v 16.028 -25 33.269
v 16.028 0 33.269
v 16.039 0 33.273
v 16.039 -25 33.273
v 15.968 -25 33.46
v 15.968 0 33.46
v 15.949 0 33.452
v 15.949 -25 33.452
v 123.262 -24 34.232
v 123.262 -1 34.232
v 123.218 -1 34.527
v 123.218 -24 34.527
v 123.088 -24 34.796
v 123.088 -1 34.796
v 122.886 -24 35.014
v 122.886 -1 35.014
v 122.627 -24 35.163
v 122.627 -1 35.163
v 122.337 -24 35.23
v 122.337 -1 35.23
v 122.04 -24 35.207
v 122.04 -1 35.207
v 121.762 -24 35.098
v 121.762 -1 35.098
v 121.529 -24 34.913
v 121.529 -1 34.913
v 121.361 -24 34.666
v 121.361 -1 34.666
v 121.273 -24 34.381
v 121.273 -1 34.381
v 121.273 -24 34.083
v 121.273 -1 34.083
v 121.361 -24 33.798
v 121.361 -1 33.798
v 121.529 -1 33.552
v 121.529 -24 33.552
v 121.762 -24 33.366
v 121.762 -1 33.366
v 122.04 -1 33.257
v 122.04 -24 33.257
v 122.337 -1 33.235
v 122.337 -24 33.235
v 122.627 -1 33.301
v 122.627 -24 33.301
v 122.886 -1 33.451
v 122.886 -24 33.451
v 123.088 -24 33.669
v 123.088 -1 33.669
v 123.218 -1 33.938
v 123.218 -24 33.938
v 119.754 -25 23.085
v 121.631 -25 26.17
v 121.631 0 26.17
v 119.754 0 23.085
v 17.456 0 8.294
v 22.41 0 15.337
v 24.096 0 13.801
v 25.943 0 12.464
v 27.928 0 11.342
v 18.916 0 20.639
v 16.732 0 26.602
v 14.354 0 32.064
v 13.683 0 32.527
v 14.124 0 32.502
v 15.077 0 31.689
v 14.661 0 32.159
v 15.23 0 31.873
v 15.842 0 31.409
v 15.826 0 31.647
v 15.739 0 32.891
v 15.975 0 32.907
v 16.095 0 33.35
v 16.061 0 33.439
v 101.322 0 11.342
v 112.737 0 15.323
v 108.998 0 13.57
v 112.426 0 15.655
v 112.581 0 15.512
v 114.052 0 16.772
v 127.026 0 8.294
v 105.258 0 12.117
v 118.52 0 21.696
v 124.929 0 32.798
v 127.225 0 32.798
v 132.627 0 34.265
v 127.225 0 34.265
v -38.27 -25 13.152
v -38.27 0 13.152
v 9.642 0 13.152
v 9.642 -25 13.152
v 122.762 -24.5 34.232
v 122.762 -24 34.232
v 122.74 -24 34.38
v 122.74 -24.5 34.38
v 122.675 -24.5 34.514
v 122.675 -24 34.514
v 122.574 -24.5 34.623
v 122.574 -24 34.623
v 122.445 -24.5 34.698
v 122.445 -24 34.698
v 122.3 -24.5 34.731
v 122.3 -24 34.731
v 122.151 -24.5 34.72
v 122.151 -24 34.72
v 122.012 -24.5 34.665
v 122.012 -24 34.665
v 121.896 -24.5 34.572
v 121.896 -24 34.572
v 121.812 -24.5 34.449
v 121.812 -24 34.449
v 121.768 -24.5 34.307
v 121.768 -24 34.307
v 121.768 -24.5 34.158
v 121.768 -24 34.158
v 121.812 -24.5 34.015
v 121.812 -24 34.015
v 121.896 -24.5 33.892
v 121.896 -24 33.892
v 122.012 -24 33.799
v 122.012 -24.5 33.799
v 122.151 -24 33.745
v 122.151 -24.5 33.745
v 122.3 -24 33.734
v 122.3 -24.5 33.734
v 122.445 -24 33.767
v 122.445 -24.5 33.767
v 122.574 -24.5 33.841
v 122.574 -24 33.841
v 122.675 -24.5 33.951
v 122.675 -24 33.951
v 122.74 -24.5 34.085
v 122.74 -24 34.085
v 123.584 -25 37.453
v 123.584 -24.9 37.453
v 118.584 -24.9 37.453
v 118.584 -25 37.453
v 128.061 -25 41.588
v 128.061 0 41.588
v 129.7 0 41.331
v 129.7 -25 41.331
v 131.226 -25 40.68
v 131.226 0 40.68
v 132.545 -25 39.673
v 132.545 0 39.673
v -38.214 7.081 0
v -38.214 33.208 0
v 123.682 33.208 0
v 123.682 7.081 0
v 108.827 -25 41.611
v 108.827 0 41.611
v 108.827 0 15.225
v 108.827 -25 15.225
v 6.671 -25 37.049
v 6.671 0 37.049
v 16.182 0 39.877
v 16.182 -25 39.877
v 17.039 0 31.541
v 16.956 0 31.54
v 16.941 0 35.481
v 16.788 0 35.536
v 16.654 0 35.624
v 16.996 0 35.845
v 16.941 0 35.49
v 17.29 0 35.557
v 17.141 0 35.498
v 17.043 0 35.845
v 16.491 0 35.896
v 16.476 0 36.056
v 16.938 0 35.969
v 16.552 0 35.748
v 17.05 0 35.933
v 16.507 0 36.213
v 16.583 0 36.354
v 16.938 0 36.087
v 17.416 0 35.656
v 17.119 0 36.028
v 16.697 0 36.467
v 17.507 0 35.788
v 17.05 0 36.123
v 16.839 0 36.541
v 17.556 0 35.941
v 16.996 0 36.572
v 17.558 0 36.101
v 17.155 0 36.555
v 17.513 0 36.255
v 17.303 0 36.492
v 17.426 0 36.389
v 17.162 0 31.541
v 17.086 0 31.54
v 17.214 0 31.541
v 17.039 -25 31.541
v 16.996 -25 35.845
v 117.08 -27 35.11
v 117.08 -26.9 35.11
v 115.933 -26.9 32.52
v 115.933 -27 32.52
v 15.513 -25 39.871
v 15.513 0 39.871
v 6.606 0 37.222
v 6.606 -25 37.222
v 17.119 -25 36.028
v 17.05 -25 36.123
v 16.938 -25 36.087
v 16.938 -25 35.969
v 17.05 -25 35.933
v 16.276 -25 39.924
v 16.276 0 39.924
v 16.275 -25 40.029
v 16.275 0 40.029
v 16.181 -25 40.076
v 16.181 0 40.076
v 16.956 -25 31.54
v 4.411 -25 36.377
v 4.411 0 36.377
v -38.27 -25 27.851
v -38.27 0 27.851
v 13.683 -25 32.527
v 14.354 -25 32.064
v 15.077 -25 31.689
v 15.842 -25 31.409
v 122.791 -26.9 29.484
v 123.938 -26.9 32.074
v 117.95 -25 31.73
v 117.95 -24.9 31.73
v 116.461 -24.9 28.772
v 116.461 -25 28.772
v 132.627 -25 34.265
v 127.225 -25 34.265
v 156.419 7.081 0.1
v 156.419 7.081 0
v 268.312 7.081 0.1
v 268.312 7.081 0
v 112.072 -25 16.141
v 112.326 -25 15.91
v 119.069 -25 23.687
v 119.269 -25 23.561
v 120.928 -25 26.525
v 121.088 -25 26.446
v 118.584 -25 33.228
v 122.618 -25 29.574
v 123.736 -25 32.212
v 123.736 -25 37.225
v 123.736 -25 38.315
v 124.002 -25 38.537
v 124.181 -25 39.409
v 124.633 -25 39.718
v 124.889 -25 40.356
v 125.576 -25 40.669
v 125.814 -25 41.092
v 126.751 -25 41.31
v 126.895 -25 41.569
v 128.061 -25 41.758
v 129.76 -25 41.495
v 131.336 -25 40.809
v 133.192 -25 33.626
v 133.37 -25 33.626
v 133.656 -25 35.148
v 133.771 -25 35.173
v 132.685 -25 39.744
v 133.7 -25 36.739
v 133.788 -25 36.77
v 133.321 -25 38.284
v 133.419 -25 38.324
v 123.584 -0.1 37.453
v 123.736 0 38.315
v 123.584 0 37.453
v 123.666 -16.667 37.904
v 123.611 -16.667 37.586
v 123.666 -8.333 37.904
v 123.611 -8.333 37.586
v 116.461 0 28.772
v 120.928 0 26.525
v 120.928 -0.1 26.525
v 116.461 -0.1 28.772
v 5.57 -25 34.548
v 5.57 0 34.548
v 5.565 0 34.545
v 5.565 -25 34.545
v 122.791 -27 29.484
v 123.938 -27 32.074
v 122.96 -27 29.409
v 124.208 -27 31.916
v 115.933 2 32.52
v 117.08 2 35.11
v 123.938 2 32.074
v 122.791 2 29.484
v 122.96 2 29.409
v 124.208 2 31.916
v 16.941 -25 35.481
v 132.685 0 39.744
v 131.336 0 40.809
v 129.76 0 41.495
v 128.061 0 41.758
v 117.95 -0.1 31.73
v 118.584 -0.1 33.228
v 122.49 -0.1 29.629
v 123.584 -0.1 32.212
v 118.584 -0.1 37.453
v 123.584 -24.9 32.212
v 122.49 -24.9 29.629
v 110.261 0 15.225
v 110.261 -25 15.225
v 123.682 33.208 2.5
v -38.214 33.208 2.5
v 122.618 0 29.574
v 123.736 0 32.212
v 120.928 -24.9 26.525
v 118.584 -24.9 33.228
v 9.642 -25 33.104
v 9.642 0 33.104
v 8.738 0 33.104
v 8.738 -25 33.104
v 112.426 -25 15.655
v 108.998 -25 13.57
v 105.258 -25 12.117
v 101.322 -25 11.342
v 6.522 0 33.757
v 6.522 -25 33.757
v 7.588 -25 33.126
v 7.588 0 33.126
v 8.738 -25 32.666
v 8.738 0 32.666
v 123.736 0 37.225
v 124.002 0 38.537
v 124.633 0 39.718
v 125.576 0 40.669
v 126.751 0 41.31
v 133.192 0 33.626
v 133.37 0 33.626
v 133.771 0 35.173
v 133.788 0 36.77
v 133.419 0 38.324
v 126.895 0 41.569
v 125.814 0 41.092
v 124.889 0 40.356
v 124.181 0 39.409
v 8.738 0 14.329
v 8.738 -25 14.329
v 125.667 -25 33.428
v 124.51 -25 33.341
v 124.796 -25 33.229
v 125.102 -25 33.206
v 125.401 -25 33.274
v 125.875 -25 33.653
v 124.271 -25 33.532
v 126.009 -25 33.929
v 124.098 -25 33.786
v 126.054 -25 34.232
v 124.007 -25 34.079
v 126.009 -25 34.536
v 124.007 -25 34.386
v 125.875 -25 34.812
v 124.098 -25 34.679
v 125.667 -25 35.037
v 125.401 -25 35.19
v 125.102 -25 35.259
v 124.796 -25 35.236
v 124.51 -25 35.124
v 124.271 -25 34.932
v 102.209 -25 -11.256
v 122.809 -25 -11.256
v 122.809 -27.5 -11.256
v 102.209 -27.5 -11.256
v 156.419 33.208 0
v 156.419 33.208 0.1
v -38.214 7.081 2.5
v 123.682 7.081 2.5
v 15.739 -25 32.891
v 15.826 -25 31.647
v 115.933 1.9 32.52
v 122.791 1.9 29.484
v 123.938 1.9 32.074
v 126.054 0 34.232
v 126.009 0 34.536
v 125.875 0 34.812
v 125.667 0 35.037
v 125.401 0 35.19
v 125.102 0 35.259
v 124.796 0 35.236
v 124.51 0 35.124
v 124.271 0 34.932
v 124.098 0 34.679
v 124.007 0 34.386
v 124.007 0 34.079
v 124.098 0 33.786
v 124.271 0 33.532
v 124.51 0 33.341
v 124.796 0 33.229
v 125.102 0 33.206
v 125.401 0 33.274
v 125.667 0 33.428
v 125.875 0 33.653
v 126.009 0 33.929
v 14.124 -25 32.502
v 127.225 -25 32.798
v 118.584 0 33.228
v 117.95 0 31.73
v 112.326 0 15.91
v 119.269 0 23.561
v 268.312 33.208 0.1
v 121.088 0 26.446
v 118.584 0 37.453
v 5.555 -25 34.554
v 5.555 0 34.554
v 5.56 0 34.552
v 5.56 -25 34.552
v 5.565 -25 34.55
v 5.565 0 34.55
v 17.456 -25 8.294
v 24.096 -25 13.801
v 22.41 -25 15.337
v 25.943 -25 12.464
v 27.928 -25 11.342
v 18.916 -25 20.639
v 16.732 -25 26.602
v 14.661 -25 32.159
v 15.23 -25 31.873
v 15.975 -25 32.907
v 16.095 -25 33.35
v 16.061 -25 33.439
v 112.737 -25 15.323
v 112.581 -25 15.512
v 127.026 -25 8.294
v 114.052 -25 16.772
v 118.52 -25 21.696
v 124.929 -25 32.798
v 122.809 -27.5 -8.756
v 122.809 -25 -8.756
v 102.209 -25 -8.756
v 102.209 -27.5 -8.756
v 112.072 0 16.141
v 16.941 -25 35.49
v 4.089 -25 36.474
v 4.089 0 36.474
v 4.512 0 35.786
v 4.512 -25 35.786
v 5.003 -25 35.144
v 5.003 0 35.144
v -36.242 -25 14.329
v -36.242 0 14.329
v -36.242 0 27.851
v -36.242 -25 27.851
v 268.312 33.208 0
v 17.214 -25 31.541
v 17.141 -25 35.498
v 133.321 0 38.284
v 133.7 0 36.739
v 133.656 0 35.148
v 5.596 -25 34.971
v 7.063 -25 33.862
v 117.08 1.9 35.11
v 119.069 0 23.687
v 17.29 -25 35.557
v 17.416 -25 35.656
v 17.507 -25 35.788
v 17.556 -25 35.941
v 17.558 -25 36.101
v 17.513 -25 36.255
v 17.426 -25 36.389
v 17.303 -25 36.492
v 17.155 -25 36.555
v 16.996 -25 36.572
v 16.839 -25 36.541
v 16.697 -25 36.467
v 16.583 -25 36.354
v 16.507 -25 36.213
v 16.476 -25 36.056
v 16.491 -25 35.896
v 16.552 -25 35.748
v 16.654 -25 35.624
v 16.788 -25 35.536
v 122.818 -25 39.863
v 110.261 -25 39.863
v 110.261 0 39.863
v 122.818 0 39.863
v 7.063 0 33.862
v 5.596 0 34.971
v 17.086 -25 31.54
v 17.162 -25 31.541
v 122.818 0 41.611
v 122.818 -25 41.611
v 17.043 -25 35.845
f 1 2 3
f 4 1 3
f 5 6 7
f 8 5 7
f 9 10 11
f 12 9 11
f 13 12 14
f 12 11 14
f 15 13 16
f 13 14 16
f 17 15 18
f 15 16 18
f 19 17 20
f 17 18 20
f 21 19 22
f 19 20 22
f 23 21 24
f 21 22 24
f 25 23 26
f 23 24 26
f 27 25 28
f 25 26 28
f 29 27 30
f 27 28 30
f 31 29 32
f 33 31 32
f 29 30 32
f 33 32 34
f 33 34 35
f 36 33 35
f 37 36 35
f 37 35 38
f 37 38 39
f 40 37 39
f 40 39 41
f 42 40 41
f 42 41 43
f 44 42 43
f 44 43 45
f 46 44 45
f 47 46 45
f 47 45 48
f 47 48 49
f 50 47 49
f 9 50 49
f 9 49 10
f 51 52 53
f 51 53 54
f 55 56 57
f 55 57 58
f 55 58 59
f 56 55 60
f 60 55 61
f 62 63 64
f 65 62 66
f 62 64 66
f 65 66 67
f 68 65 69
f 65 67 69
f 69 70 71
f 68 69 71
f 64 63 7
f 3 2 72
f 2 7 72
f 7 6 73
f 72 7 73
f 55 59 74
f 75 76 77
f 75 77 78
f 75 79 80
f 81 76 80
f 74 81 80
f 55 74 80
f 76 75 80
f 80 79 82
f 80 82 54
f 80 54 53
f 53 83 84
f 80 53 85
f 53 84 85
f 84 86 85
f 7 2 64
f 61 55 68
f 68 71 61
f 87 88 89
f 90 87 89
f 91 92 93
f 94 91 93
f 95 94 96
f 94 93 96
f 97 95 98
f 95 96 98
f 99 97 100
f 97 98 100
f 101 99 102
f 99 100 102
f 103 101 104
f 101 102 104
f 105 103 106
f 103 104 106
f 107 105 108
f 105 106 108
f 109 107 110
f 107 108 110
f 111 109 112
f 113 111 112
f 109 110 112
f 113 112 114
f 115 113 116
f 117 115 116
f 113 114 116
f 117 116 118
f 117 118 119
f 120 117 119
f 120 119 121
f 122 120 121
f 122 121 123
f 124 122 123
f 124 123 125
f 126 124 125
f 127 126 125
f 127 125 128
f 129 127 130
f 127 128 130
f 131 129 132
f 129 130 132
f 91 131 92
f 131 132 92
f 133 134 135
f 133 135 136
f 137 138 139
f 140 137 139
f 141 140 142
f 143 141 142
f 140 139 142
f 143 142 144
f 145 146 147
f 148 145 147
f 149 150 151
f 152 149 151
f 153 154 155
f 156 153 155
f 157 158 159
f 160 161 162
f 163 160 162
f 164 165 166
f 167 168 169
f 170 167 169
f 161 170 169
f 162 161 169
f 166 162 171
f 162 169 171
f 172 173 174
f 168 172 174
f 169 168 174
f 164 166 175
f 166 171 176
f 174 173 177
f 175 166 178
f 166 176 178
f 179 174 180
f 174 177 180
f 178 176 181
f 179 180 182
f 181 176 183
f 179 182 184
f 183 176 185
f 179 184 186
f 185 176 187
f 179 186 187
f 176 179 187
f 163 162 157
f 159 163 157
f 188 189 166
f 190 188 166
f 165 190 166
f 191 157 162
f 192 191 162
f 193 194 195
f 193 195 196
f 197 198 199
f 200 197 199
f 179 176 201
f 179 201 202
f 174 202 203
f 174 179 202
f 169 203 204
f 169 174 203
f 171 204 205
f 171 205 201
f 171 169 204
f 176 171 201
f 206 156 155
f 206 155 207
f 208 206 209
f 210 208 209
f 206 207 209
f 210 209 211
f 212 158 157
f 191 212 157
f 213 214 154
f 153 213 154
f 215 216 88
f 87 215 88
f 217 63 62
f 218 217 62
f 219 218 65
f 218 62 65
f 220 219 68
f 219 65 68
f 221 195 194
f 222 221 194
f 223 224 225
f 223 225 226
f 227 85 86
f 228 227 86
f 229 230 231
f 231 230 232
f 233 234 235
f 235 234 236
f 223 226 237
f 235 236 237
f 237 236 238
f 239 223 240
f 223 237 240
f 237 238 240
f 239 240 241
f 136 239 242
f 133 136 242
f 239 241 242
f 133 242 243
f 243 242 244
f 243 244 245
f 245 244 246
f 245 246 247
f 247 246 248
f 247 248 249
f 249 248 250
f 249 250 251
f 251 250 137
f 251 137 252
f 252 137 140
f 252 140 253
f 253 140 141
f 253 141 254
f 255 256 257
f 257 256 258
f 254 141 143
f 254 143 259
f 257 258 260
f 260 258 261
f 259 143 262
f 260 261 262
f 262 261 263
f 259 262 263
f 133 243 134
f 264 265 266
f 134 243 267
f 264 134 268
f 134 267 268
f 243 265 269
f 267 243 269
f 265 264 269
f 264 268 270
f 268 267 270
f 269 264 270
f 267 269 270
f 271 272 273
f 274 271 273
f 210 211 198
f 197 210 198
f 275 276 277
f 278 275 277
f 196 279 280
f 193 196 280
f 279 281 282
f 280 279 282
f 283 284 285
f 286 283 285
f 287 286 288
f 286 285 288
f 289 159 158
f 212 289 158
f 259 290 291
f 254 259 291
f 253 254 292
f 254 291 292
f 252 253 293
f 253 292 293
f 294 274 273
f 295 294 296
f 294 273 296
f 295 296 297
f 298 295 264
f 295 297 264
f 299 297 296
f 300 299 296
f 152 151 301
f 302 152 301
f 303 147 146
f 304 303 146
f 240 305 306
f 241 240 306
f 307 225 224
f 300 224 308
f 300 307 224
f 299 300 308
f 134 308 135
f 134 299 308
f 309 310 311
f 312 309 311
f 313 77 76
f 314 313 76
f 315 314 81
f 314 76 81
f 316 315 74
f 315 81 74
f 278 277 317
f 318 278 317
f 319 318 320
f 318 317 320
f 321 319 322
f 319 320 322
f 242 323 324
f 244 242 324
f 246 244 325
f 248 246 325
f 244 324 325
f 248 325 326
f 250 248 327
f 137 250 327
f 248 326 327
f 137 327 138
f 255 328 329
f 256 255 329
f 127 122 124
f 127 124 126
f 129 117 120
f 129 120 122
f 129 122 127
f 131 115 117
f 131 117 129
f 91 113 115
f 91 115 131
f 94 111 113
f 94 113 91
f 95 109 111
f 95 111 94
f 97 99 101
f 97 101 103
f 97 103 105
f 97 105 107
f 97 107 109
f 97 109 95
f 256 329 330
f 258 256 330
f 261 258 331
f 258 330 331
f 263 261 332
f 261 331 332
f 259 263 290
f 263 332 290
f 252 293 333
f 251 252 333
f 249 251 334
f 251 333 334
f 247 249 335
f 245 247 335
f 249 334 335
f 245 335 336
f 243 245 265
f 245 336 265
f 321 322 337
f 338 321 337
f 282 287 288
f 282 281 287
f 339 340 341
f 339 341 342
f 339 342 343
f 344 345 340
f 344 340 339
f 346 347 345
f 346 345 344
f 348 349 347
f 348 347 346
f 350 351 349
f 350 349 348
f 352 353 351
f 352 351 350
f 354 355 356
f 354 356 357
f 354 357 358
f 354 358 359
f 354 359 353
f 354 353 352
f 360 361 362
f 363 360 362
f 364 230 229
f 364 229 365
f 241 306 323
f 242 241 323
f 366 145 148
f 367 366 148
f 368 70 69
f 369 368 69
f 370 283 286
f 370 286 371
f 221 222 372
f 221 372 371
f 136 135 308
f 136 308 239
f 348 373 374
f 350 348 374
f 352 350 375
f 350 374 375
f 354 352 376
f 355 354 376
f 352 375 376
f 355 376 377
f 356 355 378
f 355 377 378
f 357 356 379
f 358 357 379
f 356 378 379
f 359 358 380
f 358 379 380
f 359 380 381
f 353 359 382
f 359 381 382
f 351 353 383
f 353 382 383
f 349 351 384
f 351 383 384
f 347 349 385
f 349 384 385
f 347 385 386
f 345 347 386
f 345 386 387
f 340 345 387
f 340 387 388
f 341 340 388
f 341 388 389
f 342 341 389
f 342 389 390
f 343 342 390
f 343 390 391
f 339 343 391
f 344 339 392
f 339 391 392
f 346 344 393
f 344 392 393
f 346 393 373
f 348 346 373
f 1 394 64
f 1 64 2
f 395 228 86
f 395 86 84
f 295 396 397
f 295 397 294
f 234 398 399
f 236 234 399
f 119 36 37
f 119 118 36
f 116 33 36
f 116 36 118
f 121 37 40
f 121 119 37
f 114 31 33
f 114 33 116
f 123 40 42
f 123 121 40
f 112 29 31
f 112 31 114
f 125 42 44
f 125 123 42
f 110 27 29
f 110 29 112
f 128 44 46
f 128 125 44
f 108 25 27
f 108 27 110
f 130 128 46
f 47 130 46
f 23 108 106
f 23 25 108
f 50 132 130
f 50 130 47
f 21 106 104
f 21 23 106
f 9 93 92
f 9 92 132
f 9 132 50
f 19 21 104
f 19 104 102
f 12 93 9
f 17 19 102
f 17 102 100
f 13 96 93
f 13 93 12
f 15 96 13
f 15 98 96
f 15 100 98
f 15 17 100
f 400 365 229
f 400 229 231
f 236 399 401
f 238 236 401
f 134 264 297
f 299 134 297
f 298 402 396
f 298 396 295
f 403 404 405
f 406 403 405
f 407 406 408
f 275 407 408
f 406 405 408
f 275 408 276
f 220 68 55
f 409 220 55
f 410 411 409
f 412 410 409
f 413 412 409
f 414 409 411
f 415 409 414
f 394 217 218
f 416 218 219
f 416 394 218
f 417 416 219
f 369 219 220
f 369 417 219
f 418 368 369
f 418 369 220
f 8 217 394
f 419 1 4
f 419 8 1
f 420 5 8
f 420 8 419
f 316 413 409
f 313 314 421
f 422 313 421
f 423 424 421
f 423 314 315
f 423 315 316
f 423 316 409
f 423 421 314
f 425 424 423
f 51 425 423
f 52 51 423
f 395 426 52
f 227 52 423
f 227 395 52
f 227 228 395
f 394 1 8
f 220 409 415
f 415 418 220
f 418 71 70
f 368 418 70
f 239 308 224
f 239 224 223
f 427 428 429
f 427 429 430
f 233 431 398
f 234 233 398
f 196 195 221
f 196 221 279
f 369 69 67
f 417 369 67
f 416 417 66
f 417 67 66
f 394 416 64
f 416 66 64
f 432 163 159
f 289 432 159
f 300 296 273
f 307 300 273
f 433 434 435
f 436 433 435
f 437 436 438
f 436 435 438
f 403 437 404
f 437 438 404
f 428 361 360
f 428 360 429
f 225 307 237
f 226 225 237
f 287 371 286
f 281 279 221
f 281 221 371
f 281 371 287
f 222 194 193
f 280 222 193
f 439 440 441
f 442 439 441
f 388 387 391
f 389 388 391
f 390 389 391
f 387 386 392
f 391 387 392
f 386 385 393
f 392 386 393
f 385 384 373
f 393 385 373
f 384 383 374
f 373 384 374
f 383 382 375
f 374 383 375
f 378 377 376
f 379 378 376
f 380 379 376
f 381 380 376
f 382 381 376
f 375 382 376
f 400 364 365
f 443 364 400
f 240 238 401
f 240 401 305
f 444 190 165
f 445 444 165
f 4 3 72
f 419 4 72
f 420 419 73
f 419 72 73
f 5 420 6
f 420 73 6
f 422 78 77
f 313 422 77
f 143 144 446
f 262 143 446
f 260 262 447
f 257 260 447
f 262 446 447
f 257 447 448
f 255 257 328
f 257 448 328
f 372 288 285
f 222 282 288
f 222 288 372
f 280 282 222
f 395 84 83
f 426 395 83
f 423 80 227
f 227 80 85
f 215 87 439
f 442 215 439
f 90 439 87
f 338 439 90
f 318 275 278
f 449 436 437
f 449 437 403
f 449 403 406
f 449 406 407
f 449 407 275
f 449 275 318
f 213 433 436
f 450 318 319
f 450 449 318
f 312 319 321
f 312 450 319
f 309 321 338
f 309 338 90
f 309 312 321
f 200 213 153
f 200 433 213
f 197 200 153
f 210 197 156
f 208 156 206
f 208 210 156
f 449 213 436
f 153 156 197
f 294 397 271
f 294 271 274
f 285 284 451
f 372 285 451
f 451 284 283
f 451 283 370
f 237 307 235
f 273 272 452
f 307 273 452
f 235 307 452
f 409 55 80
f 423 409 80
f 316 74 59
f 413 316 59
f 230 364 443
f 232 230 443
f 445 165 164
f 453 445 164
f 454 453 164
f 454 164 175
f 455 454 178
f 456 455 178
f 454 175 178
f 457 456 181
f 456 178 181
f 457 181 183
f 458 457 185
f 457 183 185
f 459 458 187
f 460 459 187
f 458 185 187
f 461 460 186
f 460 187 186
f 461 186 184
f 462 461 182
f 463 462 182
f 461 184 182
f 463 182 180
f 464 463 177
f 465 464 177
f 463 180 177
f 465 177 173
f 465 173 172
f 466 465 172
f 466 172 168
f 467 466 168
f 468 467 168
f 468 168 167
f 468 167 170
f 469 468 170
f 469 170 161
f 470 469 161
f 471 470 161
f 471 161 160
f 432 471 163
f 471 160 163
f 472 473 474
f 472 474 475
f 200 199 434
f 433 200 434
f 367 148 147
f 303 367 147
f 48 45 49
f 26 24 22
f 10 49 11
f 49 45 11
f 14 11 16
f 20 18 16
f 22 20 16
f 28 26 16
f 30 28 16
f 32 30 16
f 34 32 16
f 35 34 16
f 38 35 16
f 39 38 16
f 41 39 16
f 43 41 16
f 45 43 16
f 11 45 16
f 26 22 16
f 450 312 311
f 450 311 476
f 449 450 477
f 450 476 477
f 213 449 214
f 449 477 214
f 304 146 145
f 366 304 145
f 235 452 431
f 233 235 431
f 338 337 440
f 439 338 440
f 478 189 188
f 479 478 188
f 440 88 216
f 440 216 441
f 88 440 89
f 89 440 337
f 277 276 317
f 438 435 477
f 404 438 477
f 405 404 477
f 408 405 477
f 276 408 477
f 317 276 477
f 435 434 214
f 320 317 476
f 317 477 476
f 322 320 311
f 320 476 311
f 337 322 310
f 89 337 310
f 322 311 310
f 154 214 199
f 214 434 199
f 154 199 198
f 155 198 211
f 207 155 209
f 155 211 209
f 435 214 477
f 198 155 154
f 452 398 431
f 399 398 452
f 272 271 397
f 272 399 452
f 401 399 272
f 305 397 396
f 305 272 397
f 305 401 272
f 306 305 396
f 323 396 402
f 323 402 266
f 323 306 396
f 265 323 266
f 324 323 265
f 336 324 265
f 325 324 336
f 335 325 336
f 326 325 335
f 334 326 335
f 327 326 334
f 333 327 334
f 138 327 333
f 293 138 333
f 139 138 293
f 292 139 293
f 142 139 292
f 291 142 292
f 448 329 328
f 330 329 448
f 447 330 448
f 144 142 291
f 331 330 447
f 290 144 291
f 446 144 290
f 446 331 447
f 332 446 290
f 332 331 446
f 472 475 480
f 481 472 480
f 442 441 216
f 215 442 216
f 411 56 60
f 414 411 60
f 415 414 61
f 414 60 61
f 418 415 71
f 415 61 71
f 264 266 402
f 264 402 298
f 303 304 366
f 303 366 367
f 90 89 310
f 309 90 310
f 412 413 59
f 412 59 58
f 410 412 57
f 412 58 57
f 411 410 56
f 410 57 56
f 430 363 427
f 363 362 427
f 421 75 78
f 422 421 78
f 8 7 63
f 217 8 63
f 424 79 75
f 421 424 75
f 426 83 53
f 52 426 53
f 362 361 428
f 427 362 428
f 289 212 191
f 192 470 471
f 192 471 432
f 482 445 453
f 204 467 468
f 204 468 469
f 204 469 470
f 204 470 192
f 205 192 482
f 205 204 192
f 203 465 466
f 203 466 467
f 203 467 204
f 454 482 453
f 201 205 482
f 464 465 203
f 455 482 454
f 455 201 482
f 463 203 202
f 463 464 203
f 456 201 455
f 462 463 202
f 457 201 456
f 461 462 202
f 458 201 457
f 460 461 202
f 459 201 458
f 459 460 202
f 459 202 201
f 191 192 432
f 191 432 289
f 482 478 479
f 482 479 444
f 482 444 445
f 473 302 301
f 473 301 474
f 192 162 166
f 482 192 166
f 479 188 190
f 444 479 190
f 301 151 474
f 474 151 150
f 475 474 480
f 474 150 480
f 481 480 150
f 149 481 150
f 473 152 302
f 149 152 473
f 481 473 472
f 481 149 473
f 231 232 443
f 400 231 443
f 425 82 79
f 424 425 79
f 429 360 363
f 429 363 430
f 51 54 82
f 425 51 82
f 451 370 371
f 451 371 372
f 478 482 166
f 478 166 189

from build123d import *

# Parameters (mm, degrees)
F1_DEPTH  = 25
F0_R      = 0.1
F2_DEPTH  = 25
F3_DEPTH  = 25
F5_DEPTH  = 2.5
F4_W      = 111.8926256895
F4_H      = 26.1270403862
F7_DEPTH  = 0.1
F0_R_2    = 1
F9_DEPTH  = 24
F0_R_3    = 1.029169814
F10_DEPTH = 25
F11_DEPTH = 25
F12_W     = 2.5
F12_H     = 2.5
F13_DEPTH = 2.5
F14_DEPTH = 18.1
F15_DEPTH = 25
F16_DEPTH = 1
F17_W     = 0.1
F17_H     = 5.2410326541
F18_DEPTH = 5
F19_DEPTH = 5
F20_W     = 0.1
F20_H     = 2.80523311
F21_DEPTH = 5
F22_W     = 0.1
F22_H     = 3.4750518822
F23_DEPTH = 5
F24_R     = 0.5
F25_DEPTH = 0.5
F26_DEPTH = 27
F27_DEPTH = 2
F28_W     = 0.1
F28_H     = 2.8330418504
F29_DEPTH = 7.5


with BuildPart() as f1:
    # F0 (on Front) → F1 (new body)
    with BuildSketch(Plane.XZ):
        with BuildLine():
            Line((-36.2419492344, 19.3617755631), (-36.2419492344, 27.8505100084))
            Line((-36.2419492344, 27.8505100084), (-38.2702921091, 27.8505100084))
            Line((-38.2702921091, 27.8505100084), (-38.2702921091, 17.8051125258))
            Line((-38.2702921091, 17.8051125258), (-38.2702921091, 13.151739724))
            Line((-38.2702921091, 13.151739724), (-36.2419492344, 13.151739724))
            Line((-36.2419492344, 13.151739724), (2.6482119562, 13.151739724))
            Line((2.6482119562, 13.151739724), (4.0816886356, 13.151739724))
            Line((4.0816886356, 13.151739724), (5.2144867368, 13.151739724))
            Line((5.2144867368, 13.151739724), (9.6417907625, 13.151739724))
            Line((9.6417907625, 13.151739724), (9.6417907625, 33.1040173769))
            Line((9.6417907625, 33.1040173769), (8.7377969176, 33.1040173769))
            ThreePointArc((8.7377969176, 33.1040173769), (6.2984196882, 34.3754623057), (4.4109269915, 36.3765881873))
            Line((4.4109269915, 36.3765881873), (6.6710681562, 37.0486121721))
            Line((6.6710681562, 37.0486121721), (16.1820917551, 39.8765930424))
            ThreePointArc((16.1820917551, 39.8765930424), (16.2900508454, 39.9769898902), (16.1806685582, 40.07583425))
            Line((16.1806685582, 40.07583425), (15.5127520888, 39.8706265812))
            Line((15.5127520888, 39.8706265812), (6.605698304, 37.222228388))
            Line((6.605698304, 37.222228388), (4.0887155386, 36.4738358477))
            ThreePointArc((4.0887155386, 36.4738358477), (4.7494520955, 35.4586315177), (5.5552186019, 34.5542239954))
            ThreePointArc((5.5552186019, 34.5542239954), (5.5627548213, 34.5508868433), (5.5703019163, 34.5475743601))
            Line((5.5703019163, 34.5475743601), (5.5652904298, 34.5445212662))
            ThreePointArc((5.5652904298, 34.5445212662), (7.0424290401, 33.4211601216), (8.7377969176, 32.6664373279))
            Line((8.7377969176, 32.6664373279), (8.7377969176, 14.3285310603))
            Line((8.7377969176, 14.3285310603), (4.0816886356, 14.3285310603))
            Line((4.0816886356, 14.3285310603), (3.1791766089, 14.3285310603))
            Line((3.1791766089, 14.3285310603), (2.6482119562, 14.3285310603))
            Line((2.6482119562, 14.3285310603), (-36.2419492344, 14.3285310603))
            Line((-36.2419492344, 14.3285310603), (-36.2419492344, 17.8051125258))
            Line((-36.2419492344, 17.8051125258), (-36.2419492344, 19.3617755631))
        make_face()
    extrude(amount=F1_DEPTH)


with BuildPart() as f2:
    # F0 (on Front) → F2 (new body)
    with BuildSketch(Plane.XZ):
        with BuildLine():
            Line((17.0863868074, 31.5404682002), (17.1616906385, 31.5412189812))
            Line((17.1616906385, 31.5412189812), (17.2143504024, 31.5412189812))
            Line((17.2143504024, 31.5412189812), (17.1411414098, 35.4980701954))
            ThreePointArc((17.1411414098, 35.4980701954), (16.9960731361, 36.5716056427), (16.9411982293, 35.4897036577))
            Line((16.9411982293, 35.4897036577), (16.9412299734, 35.4812592268))
            Line((16.9412299734, 35.4812592268), (16.956044361, 31.5403920674))
            Line((16.956044361, 31.5403920674), (17.0389843607, 31.5412189812))
            Line((17.0389843607, 31.5412189812), (16.9960796582, 35.8445889841))
            Line((16.9960796582, 35.8445889841), (17.0434699089, 35.845061466))
            Line((17.0434699089, 35.845061466), (17.0863868074, 31.5404682002))
        make_face()
        with Locations((17.0188155025, 36.0281094909)):
            Circle(F0_R, mode=Mode.SUBTRACT)
    extrude(amount=F2_DEPTH)


with BuildPart() as f3:
    # F0 (on Front) → F3 (new body)
    with BuildSketch(Plane.XZ):
        with BuildLine():
            Line((15.974551759, 32.9070240818), (15.7390532541, 32.8905579479))
            Line((15.7390532541, 32.8905579479), (15.8258194037, 31.647307481))
            ThreePointArc((15.8258194037, 31.647307481), (14.9421305035, 32.0087762715), (14.1244188358, 32.5016387142))
            Line((14.1244188358, 32.5016387142), (16.0277553286, 33.2687634208))
            Line((16.0277553286, 33.2687634208), (16.0388313234, 33.2732275128))
            ThreePointArc((16.0388313234, 33.2732275128), (16.0894967732, 33.3989948726), (15.9682331313, 33.4596541319))
            Line((15.9682331313, 33.4596541319), (15.9485619576, 33.4516239712))
            Line((15.9485619576, 33.4516239712), (13.6827294276, 32.5266664916))
            ThreePointArc((13.6827294276, 32.5266664916), (14.7096441045, 31.8653397654), (15.842477521, 31.4086174833))
            Line((15.842477521, 31.4086174833), (17.45560838, 8.2944686623))
            Line((17.45560838, 8.2944686623), (83.3052264349, 8.2944686623))
            Line((83.3052264349, 8.2944686623), (127.025753987, 8.2944686623))
            Line((127.025753987, 8.2944686623), (132.6270318248, 34.2650240802))
            Line((132.6270318248, 34.2650240802), (127.2254871146, 34.2650240802))
            Line((127.2254871146, 34.2650240802), (127.2254871146, 32.7977798879))
            Line((127.2254871146, 32.7977798879), (124.9292716384, 32.7977798879))
            Line((124.9292716384, 32.7977798879), (121.6305866838, 26.1700805277))
            Line((121.6305866838, 26.1700805277), (119.7535917163, 23.0848435313))
            Line((119.7535917163, 23.0848435313), (118.51978302, 21.6958448291))
            Line((118.51978302, 21.6958448291), (114.0516985243, 16.7718687662))
            Line((114.0516985243, 16.7718687662), (112.7371454729, 15.3231880699))
            Line((112.7371454729, 15.3231880699), (112.5809922814, 15.5116021633))
            Line((112.5809922814, 15.5116021633), (112.4264257385, 15.6547916588))
            ThreePointArc((112.4264257385, 15.6547916588), (107.1604444389, 12.7610850557), (101.3218328068, 11.3416798413))
            Line((101.3218328068, 11.3416798413), (27.9276734218, 11.3416798413))
            ThreePointArc((27.9276734218, 11.3416798413), (25.0007024184, 13.1068332587), (22.4102342692, 15.3367212849))
            ThreePointArc((22.4102342692, 15.3367212849), (17.6514651044, 23.557458802), (15.974551759, 32.9070240818))
        make_face()
    extrude(amount=F3_DEPTH)


with BuildPart() as f5:
    # F4 (on Top) → F5 (new body)
    with BuildSketch(Plane.XY):
        Polygon((62.8758221865, 33.2082095556), (-38.2138518617, 33.2082095556), (-38.2138518617, 7.0811691694), (79.9682810903, 7.0811691694), (123.6817026511, 7.0811691694), (123.6817026511, 33.2082095556), (79.9682810903, 33.2082095556), align=None)
    extrude(amount=F5_DEPTH)


with BuildPart() as f7:
    # F4 (on Top) → F7 (new body)
    with BuildSketch(Plane.XY):
        with Locations((212.3654559255, 20.1446893625)):
            Rectangle(F4_W, F4_H)
    extrude(amount=F7_DEPTH)


with BuildPart() as f9:
    # F0 (on Front) → F9 (new body)
    with BuildSketch(Plane.XZ):
        with Locations((122.2621365883, 34.2323705822)):
            Circle(F0_R_2)
    extrude(amount=F9_DEPTH)

    # F0 (on Front) → F16 (cut)
    with BuildSketch(Plane.XZ):
        with Locations((122.2621365883, 34.2323705822)):
            Circle(F0_R_2)
    extrude(amount=F16_DEPTH, mode=Mode.SUBTRACT)

    # F24 (on face) → F25 (join)
    with BuildSketch(Plane.XZ.offset(24)):
        with Locations((122.2621365883, 34.2323705822)):
            Circle(F24_R)
    extrude(amount=F25_DEPTH)


with BuildPart() as f10:
    # F0 (on Front) → F10 (new body)
    with BuildSketch(Plane.XZ):
        with Locations((125.0250758016, 34.2323705822)):
            Circle(F0_R_3)
    extrude(amount=F10_DEPTH)


with BuildPart() as f11:
    # F0 (on Front) → F11 (new body)
    with BuildSketch(Plane.XZ):
        with BuildLine():
            add(Edge.make_bspline(
                [(123.7358884551, 38.3147671819), (123.6640356194, 37.8885400182), (123.5921827837, 37.4623128546), (123.5840916634, 37.4529585242)],
                knots=[0, 0, 0, 0, 0.5401278987, 0.5401278987, 0.5401278987, 0.5401278987], degree=3))
            Line((123.5840916634, 37.4529585242), (123.5840916634, 32.2119258344))
            Line((123.5840916634, 32.2119258344), (122.489631176, 29.6290032566))
            Line((122.489631176, 29.6290032566), (120.9279439646, 26.5246323641))
            Line((120.9279439646, 26.5246323641), (119.0692239903, 23.6874741994))
            Line((119.0692239903, 23.6874741994), (112.0717409975, 16.1407688561))
            Line((112.0717409975, 16.1407688561), (112.3260706663, 15.9099865705))
            Line((112.3260706663, 15.9099865705), (119.2690879107, 23.5614199191))
            Line((119.2690879107, 23.5614199191), (121.0884749889, 26.4461282641))
            Line((121.0884749889, 26.4461282641), (122.6183219632, 29.5744731739))
            Line((122.6183219632, 29.5744731739), (123.7358884551, 32.2119258344))
            Line((123.7358884551, 32.2119258344), (123.7358884551, 37.2249037027))
            ThreePointArc((123.7358884551, 37.2249037027), (125.069983338, 40.2278534689), (128.061234951, 41.5879748762))
            ThreePointArc((128.061234951, 41.5879748762), (130.483458084, 41.0528650598), (132.544875145, 39.672985673))
            ThreePointArc((132.544875145, 39.672985673), (133.700153354, 36.7385663947), (133.1917345524, 33.6261726916))
            Line((133.1917345524, 33.6261726916), (133.3702355623, 33.6261726916))
            ThreePointArc((133.3702355623, 33.6261726916), (133.7879091067, 36.77001222), (132.685393095, 39.7436693311))
            ThreePointArc((132.685393095, 39.7436693311), (130.5701061838, 41.2025168017), (128.061234951, 41.757710278))
            ThreePointArc((128.061234951, 41.757710278), (125.327879489, 40.7531829972), (123.7358884551, 38.3147671819))
        make_face()
    extrude(amount=F11_DEPTH)

    # F17 (on face) → F18 (join)
    with BuildSketch(Plane(origin=(123.5840916634, 0, 0), x_dir=(0, -1, 0), z_dir=(-1, 0, 0))):
        with Locations((24.95, 34.8324421615)):
            Rectangle(F17_W, F17_H)
    extrude(amount=F18_DEPTH)

    # F17 (on face) → F19 (join)
    with BuildSketch(Plane(origin=(123.5840916634, 0, 0), x_dir=(0, -1, 0), z_dir=(-1, 0, 0))):
        with Locations((0.05, 34.8324421615)):
            Rectangle(F17_W, F17_H)
    extrude(amount=F19_DEPTH)

    # F20 (on face) → F21 (join)
    with BuildSketch(Plane(origin=(93.2010149865, 0, -39.4920192961), x_dir=(0, -1, 0), z_dir=(-0.9207514943, 0, 0.3901495685))):
        with Locations((0.05, 76.4728423241)):
            Rectangle(F20_W, F20_H)
        with Locations((24.95, 76.4728423241)):
            Rectangle(F20_W, F20_H)
    extrude(amount=F21_DEPTH)

    # F22 (on face) → F23 (join)
    with BuildSketch(Plane(origin=(85.8566800835, 0, -43.1911275896), x_dir=(0, -1, 0), z_dir=(-0.8933308042, 0, 0.4493996822))):
        with Locations((24.95, 79.7777766848)):
            Rectangle(F22_W, F22_H)
        with Locations((0.05, 79.7777766848)):
            Rectangle(F22_W, F22_H)
    extrude(amount=F23_DEPTH)


with BuildPart() as f13:
    # F12 (on face) → F13 (new body)
    with BuildSketch(Plane.XZ.offset(25)):
        with Locations((121.5591508434, -10.0059854994)):
            Rectangle(F12_W, F12_H)
    extrude(amount=F13_DEPTH)

    # F14 (add): a face of the model
    f14_faces = [f13.faces().sort_by_distance(p)[0] for p in [
        (120.3091508434, -26.25, -10.0059854994),
    ]]
    extrude(f14_faces, amount=F14_DEPTH)


with BuildPart() as f15:
    # F0 (on Front) → F15 (new body)
    with BuildSketch(Plane.XZ):
        Polygon((110.2612314535, 15.2245052159), (110.2612314535, 39.8633848509), (122.817799449, 39.8633848509), (122.817799449, 41.6112653911), (108.8265553117, 41.6112653911), (108.8265553117, 39.8633848509), (108.8265553117, 15.2245052159), align=None)
    extrude(amount=F15_DEPTH)


with BuildPart() as f26:
    # F0 (on Front) → F26 (new body)
    with BuildSketch(Plane.XZ):
        Polygon((124.2079875145, 31.9161439477), (123.9376217127, 32.0740118623), (122.7906420827, 29.4835362583), (122.9599411014, 29.4085760752), align=None)
    extrude(amount=F26_DEPTH)

    # F27 (add): a face of the model
    f27_faces = [f26.faces().sort_by_distance(p)[0] for p in [
        (123.5247767619, 0, 30.8289974275),
    ]]
    extrude(f27_faces, amount=F27_DEPTH)

    # F28 (on face) → F29 (join)
    with BuildSketch(Plane(origin=(91.7494042817, 0, -40.6236976774), x_dir=(0, -1, 0), z_dir=(-0.9143795753, 0, 0.4048579903))):
        with Locations((26.95, 78.088436868)):
            Rectangle(F28_W, F28_H)
        with Locations((-1.95, 78.088436868)):
            Rectangle(F28_W, F28_H)
    extrude(amount=F29_DEPTH)


solid = Compound([f1.part, f2.part, f3.part, f5.part, f7.part, f9.part, f10.part, f11.part, f13.part, f15.part, f26.part])
